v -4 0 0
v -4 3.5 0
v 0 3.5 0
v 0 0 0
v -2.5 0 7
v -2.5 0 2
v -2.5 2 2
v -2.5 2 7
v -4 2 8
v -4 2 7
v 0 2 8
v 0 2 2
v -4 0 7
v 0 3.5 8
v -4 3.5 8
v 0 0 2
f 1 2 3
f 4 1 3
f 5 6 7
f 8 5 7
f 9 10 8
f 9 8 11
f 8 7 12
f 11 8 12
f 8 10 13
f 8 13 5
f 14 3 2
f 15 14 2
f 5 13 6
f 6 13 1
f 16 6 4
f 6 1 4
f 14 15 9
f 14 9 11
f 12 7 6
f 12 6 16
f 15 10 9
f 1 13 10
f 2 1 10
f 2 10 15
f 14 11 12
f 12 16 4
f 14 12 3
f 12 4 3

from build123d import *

# Parameters (mm, degrees)
F1_DEPTH = 8
F0_W     = 1.5
F0_H     = 2
F2_DEPTH = 7
F0_W_2   = 2.5
F3_DEPTH = 2


with BuildPart() as f1:
    # F0 (on Top) → F1 (new body)
    with BuildSketch(Plane.XY):
        Polygon((-2.5, 2), (0, 2), (0, 3.5), (-4, 3.5), (-4, 2), align=None)
    extrude(amount=F1_DEPTH)

    # F0 (on Top) → F2 (join)
    with BuildSketch(Plane.XY):
        with Locations((-3.25, 1)):
            Rectangle(F0_W, F0_H)
    extrude(amount=F2_DEPTH)

    # F0 (on Top) → F3 (join)
    with BuildSketch(Plane.XY):
        with Locations((-1.25, 1)):
            Rectangle(F0_W_2, F0_H)
    extrude(amount=F3_DEPTH)


solid = f1.part
